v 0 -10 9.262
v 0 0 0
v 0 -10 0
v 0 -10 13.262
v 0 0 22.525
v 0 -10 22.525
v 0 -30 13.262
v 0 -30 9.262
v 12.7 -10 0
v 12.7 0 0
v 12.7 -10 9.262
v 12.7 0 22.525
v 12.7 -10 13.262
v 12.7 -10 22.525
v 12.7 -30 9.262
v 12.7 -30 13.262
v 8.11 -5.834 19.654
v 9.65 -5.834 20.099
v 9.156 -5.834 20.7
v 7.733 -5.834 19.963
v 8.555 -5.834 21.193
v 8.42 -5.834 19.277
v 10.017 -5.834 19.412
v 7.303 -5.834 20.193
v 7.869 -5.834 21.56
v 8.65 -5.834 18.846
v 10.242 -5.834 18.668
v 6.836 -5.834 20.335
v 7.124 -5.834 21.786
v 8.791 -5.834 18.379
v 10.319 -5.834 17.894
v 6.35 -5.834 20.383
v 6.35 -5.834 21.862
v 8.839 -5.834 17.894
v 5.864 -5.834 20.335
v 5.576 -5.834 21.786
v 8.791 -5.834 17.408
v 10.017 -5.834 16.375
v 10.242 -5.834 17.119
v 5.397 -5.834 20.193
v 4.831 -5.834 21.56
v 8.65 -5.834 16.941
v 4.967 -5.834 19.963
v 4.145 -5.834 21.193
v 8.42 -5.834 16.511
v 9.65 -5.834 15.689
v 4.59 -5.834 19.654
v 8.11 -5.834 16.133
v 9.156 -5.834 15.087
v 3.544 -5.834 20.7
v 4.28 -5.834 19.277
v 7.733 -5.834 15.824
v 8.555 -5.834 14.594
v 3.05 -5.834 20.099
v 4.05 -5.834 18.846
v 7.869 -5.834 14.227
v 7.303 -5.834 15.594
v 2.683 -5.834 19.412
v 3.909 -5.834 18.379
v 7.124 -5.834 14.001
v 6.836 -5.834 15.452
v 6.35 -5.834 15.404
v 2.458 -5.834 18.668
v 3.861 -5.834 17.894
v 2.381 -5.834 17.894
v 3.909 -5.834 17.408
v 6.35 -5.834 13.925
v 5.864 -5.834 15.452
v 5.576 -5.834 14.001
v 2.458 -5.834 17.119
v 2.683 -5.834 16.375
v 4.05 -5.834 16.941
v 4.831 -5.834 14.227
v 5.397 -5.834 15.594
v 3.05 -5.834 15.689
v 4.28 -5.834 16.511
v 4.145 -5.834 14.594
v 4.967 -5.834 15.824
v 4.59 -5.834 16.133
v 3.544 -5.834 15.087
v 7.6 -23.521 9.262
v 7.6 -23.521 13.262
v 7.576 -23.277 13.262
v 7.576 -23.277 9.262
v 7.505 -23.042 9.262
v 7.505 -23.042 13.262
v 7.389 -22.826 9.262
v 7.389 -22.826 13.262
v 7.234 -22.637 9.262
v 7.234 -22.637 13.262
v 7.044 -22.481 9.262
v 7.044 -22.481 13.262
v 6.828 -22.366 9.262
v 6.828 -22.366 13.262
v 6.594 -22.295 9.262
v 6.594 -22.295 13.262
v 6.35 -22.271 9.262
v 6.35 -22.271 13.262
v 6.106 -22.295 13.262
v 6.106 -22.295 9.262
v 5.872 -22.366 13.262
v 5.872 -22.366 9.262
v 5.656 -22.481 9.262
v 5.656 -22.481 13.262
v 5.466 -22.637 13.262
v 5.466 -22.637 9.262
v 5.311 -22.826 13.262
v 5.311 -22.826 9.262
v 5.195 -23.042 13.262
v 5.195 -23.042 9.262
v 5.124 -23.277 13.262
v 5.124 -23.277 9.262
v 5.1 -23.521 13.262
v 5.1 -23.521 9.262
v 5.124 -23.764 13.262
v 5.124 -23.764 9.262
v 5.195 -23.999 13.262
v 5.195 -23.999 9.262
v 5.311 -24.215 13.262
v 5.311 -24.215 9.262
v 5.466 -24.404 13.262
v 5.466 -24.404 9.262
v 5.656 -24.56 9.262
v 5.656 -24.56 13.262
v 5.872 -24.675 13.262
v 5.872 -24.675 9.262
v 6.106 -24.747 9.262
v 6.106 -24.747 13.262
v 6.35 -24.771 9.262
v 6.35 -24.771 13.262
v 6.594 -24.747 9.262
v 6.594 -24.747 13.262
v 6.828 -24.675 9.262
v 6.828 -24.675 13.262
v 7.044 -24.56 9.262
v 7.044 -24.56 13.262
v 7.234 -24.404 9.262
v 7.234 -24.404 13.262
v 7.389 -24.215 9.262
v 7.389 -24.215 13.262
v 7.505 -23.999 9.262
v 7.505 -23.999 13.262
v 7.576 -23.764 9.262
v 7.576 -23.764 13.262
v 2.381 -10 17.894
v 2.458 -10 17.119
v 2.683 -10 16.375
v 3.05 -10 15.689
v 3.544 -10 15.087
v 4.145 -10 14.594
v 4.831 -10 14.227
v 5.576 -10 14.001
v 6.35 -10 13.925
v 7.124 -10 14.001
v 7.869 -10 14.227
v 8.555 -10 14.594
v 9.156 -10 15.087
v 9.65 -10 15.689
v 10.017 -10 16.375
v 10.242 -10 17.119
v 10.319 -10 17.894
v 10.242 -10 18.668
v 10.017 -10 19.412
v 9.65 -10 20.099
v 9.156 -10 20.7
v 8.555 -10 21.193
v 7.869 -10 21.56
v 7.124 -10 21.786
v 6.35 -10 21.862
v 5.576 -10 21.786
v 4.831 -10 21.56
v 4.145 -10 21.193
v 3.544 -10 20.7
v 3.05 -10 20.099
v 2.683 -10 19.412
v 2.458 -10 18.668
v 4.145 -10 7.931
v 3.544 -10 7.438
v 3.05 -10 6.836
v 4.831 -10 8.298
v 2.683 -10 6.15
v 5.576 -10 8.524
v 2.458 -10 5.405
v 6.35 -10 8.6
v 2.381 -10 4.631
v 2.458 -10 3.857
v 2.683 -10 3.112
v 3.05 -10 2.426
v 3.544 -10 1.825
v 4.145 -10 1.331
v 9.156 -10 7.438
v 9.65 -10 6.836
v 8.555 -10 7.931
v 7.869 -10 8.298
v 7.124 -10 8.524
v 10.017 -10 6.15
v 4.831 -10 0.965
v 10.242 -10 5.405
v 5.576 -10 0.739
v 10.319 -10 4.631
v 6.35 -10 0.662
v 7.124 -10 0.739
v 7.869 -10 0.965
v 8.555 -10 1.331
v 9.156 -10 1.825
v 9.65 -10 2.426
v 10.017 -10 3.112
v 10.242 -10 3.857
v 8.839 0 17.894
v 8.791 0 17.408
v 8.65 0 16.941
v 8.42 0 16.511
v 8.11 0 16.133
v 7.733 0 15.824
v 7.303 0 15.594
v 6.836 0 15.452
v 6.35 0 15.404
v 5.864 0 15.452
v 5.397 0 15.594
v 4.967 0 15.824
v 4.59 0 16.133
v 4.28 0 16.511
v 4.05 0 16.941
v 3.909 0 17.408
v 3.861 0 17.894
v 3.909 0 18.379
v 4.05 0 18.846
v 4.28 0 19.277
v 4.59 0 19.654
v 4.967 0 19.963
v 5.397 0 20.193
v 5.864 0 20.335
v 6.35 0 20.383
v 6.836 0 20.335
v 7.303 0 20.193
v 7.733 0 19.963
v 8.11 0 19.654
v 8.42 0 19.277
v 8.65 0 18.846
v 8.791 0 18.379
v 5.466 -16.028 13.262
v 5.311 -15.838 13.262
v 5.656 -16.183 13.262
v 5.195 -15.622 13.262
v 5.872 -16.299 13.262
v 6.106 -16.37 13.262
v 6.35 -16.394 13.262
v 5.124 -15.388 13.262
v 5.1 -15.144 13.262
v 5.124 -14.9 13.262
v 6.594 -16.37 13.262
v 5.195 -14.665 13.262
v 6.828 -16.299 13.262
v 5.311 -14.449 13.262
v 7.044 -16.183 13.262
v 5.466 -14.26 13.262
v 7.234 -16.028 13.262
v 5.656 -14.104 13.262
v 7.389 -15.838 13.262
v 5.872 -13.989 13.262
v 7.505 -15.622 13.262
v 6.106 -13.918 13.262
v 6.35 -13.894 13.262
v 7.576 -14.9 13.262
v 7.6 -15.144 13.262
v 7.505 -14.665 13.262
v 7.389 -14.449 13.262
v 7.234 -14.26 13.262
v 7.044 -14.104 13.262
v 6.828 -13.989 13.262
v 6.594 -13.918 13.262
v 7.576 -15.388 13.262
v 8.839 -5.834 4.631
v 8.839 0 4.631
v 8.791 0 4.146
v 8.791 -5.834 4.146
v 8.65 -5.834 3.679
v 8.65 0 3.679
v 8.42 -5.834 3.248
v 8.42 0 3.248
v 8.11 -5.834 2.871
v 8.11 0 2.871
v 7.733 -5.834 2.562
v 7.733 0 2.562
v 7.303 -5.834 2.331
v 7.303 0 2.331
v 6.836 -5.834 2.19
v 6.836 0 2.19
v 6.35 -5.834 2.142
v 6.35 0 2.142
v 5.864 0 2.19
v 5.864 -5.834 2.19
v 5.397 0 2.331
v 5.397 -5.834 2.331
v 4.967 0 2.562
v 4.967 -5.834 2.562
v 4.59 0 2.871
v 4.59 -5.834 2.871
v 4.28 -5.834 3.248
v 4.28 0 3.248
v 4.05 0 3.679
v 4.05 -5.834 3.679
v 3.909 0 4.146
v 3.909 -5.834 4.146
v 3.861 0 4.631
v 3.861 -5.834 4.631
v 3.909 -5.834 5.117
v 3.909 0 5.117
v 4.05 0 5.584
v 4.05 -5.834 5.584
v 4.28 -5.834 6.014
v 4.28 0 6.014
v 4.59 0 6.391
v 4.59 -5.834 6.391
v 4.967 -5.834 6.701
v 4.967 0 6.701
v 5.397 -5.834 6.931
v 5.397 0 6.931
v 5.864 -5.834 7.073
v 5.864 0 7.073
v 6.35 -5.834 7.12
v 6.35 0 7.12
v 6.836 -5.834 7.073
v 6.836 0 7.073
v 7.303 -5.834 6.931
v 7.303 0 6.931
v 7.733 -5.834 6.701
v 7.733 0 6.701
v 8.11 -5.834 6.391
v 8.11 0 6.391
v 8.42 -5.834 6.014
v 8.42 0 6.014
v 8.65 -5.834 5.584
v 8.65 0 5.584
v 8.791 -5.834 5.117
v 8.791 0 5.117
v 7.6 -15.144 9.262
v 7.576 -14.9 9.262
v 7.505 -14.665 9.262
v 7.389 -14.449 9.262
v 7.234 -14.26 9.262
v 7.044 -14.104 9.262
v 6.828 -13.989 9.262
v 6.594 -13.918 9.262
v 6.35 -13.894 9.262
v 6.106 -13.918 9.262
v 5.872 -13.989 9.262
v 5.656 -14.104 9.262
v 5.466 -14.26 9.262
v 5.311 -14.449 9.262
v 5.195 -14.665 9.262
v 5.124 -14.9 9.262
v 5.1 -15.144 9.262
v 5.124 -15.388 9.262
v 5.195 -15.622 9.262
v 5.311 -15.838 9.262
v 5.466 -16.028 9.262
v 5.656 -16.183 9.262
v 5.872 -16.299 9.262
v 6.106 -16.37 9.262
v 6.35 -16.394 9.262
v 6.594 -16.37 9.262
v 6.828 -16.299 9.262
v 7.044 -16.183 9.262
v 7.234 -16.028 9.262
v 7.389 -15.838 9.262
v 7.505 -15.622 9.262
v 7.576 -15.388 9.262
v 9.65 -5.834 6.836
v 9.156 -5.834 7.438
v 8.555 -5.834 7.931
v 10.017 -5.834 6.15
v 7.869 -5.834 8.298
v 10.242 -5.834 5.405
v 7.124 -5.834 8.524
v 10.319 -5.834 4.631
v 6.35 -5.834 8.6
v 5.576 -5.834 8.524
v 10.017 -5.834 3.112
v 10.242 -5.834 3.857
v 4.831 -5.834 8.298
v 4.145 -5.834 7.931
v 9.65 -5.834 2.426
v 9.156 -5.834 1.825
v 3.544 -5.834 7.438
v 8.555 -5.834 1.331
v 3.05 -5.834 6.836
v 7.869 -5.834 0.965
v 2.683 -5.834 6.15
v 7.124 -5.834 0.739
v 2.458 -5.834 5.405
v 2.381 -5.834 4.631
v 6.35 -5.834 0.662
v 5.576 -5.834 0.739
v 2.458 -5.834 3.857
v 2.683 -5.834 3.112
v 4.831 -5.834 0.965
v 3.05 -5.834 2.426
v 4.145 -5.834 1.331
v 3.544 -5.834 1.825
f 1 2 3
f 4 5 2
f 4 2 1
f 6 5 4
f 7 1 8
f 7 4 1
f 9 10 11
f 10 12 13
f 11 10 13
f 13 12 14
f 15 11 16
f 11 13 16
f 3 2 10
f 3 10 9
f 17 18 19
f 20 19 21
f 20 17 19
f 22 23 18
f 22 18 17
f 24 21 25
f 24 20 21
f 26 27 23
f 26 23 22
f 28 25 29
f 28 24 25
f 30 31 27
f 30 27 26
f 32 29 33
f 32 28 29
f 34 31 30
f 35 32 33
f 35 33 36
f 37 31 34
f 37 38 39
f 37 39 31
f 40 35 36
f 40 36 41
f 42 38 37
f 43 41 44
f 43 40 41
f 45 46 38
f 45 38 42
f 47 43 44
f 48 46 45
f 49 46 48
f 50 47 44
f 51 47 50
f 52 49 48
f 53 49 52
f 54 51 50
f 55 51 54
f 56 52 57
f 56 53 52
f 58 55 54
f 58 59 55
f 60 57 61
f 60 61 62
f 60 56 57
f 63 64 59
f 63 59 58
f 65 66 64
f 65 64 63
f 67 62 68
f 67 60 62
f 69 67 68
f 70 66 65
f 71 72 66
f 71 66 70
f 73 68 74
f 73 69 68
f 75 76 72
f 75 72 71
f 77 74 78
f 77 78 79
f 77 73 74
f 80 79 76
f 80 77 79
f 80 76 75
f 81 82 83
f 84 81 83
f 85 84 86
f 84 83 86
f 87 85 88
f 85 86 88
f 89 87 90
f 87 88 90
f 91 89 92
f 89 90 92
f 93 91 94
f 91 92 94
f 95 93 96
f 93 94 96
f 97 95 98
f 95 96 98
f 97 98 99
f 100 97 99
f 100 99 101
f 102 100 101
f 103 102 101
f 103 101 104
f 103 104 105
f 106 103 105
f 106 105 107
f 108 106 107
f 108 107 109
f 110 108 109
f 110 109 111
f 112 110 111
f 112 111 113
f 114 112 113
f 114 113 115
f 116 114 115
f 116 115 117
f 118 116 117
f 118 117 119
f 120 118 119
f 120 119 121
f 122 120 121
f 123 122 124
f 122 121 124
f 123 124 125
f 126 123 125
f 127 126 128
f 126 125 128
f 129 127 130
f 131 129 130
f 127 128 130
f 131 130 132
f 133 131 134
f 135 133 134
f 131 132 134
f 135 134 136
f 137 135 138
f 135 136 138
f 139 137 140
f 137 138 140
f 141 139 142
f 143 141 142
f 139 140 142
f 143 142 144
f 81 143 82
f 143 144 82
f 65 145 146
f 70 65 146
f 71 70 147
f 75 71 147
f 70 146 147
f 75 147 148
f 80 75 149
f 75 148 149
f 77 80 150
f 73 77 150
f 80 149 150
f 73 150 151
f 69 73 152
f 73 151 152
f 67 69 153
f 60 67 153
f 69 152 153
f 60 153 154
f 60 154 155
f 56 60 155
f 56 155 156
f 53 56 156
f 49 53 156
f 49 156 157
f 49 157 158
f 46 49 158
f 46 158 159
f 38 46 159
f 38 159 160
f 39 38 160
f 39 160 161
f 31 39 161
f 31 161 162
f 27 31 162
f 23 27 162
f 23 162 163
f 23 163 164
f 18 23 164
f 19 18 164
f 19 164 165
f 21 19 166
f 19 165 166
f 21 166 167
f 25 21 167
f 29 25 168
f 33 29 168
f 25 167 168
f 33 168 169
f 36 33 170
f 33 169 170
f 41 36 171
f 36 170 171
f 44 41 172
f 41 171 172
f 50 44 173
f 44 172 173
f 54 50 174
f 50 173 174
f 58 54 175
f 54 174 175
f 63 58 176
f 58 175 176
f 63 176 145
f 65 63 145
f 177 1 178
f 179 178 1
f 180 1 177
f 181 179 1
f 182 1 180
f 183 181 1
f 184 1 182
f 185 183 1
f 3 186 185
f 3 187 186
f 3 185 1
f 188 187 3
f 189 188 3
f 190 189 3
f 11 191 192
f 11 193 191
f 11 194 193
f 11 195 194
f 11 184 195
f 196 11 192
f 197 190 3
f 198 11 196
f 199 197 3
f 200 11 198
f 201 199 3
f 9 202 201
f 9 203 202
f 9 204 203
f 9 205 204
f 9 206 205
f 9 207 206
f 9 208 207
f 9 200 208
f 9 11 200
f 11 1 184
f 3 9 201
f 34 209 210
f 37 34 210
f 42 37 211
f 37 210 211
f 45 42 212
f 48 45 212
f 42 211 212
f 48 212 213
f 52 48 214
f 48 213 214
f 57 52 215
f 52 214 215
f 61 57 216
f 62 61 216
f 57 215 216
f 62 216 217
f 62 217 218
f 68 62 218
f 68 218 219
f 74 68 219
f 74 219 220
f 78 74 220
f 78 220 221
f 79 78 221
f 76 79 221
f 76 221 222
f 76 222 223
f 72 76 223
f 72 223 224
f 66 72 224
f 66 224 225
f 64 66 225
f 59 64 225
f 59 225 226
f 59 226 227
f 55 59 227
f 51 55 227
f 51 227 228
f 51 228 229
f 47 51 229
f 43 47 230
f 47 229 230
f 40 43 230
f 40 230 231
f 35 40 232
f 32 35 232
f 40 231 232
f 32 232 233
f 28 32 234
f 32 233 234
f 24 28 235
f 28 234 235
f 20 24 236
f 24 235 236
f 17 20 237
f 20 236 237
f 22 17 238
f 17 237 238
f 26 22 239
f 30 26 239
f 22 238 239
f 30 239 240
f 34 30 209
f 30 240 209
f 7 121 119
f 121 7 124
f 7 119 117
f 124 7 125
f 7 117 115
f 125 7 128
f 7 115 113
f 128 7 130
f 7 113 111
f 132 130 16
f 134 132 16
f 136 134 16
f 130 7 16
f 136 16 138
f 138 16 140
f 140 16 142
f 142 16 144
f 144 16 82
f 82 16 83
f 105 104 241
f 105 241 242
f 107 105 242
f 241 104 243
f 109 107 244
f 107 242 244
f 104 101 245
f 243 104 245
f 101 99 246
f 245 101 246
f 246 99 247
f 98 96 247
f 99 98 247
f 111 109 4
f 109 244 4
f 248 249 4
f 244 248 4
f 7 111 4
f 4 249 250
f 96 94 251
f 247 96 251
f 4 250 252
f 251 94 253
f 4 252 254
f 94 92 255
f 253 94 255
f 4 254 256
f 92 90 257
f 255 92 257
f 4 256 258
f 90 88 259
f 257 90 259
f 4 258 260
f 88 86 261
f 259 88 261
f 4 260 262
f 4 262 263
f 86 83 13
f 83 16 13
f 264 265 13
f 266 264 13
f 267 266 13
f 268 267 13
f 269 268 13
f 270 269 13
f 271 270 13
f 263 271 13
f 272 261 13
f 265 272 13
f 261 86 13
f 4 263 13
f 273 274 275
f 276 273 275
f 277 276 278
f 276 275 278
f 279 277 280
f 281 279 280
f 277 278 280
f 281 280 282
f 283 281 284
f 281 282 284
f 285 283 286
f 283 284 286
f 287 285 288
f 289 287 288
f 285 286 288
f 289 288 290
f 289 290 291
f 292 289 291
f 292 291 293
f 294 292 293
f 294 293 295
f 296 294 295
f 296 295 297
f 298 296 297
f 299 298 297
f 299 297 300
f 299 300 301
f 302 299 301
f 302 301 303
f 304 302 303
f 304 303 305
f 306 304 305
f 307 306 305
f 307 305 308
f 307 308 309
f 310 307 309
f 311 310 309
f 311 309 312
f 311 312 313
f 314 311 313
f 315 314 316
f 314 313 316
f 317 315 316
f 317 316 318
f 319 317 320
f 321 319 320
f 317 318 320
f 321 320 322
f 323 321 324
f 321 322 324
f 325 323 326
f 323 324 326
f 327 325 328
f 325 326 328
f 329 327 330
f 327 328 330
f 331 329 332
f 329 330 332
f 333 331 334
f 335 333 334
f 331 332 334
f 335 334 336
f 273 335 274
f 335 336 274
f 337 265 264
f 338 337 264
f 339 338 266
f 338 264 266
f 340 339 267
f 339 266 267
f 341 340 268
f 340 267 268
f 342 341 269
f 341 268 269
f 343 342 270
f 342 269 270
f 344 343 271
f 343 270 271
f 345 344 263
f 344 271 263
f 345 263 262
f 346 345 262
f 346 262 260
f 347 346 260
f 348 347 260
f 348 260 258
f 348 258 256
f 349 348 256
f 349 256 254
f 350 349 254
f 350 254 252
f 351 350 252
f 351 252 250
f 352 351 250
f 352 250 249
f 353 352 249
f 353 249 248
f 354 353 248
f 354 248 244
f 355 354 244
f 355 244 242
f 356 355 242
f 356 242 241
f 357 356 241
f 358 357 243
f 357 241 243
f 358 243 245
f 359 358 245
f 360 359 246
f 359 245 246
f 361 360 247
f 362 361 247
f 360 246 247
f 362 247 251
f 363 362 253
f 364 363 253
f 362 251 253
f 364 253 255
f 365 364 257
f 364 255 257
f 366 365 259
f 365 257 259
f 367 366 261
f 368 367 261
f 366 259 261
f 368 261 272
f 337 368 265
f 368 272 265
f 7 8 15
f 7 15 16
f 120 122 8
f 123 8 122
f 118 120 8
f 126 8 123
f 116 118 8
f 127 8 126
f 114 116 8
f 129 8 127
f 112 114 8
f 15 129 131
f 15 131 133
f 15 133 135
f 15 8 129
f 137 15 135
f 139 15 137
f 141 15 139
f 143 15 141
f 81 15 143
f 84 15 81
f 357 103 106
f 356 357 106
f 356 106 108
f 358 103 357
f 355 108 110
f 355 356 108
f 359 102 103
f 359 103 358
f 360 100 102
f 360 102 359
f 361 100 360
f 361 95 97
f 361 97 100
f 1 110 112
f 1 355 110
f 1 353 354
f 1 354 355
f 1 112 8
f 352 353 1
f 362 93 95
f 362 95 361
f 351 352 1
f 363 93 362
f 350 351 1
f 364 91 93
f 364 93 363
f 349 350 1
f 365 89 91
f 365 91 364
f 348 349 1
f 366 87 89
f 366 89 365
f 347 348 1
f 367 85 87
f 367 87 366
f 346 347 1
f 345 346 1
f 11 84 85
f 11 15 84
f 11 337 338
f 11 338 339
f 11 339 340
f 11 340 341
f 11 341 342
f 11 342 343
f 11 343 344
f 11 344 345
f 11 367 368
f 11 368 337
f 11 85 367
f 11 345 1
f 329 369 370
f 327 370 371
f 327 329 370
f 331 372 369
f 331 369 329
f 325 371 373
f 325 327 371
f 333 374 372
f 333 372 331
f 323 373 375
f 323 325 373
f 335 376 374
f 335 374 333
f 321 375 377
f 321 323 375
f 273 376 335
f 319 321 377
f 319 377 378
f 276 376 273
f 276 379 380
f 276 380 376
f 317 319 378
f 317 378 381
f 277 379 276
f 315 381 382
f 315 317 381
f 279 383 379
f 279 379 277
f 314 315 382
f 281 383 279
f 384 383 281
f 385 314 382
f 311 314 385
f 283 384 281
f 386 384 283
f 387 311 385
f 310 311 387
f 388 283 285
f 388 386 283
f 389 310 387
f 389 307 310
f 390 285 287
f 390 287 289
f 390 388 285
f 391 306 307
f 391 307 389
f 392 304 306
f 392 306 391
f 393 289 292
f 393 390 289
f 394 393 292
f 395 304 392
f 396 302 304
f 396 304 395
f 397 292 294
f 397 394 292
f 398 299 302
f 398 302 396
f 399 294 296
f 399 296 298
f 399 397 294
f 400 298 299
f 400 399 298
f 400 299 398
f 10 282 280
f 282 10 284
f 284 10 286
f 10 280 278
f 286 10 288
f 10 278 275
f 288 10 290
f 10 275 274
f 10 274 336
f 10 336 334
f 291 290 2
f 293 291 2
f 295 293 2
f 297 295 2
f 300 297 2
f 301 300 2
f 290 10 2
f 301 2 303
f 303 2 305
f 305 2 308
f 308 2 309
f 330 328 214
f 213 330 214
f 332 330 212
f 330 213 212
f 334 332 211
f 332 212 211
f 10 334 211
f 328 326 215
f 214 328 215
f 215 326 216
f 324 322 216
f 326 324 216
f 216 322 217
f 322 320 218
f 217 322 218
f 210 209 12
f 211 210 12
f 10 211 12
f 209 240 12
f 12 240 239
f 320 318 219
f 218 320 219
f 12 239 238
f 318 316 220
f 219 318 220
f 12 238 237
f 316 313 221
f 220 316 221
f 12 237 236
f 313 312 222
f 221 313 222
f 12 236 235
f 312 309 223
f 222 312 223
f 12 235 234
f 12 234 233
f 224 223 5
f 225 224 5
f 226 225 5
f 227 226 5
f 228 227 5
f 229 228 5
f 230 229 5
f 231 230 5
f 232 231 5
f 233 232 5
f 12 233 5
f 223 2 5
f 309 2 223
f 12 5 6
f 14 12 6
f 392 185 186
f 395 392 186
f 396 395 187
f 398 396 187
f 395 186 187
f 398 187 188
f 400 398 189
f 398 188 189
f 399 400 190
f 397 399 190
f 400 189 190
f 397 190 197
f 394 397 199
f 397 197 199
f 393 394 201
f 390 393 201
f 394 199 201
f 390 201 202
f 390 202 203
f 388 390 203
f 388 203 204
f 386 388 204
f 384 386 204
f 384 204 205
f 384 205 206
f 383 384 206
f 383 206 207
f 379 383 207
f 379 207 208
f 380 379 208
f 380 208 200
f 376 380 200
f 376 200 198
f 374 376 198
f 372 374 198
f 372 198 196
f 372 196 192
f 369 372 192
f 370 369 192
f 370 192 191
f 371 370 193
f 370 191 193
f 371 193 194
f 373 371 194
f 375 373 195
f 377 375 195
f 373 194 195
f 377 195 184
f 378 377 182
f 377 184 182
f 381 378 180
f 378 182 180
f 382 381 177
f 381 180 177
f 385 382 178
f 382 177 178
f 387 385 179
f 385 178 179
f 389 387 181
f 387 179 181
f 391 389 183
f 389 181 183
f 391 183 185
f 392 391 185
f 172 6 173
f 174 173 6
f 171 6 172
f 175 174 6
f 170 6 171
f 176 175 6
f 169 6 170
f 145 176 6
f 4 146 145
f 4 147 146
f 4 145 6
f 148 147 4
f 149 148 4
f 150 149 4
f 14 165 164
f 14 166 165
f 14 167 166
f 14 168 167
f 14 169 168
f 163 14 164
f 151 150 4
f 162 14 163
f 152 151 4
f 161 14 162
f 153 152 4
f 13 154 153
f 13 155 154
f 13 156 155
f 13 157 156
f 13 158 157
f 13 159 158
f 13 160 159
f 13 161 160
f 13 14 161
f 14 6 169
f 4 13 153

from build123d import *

# Parameters (mm, degrees)
ESBO_O1_W                = 30
ESBO_O1_H                = 22.5248
RESSALTO_EXTRUS_O1_DEPTH = 12.7
ESBO_O2_W                = 9.2624
ESBO_O2_H                = 20
CORTE_EXTRUS_O1_DEPTH    = 13.7
ESBO_O3_W                = 9.2624
ESBO_O3_H                = 20
CORTE_EXTRUS_O2_DEPTH    = 13.7
FURO1_D                  = 4.9784
FURO1_DEPTH              = 10
FURO1_CBORE_D            = 7.9375
FURO1_CBORE_DEPTH        = 4.1656
ESBO_O8_R                = 1.25
CORTE_EXTRUS_O3_DEPTH    = 10


with BuildPart() as part:
    # Esboço1 → Ressalto-extrusão1 (new body)
    with BuildSketch(Plane(origin=(0, 0, 0), x_dir=(0, -1, 0), z_dir=(-1, 0, 0))):
        with Locations((15, 11.2624)):
            Rectangle(ESBO_O1_W, ESBO_O1_H)
    extrude(amount=-RESSALTO_EXTRUS_O1_DEPTH)

    # Esboço2 → Corte-extrusão1 (cut, through all)
    with BuildSketch(Plane(origin=(12.7, 0, 0), x_dir=(0, 0, -1), z_dir=(1, 0, 0))):
        with Locations((-4.6312, -20)):
            Rectangle(ESBO_O2_W, ESBO_O2_H)
    extrude(amount=-CORTE_EXTRUS_O1_DEPTH, mode=Mode.SUBTRACT)

    # Esboço3 → Corte-extrusão2 (cut, through all)
    with BuildSketch(Plane(origin=(12.7, 0, 0), x_dir=(0, 0, -1), z_dir=(1, 0, 0))):
        with Locations((-17.8936, -20)):
            Rectangle(ESBO_O3_W, ESBO_O3_H)
    extrude(amount=-CORTE_EXTRUS_O2_DEPTH, mode=Mode.SUBTRACT)

    # Furo1
    with Locations(Plane(origin=(0, -10, 0), x_dir=(-1, 0, 0), z_dir=(0, -1, 0))):
        with Locations((-6.35, -4.6312), (-6.35, -17.8936)):
            CounterBoreHole(FURO1_D / 2, FURO1_CBORE_D / 2, FURO1_CBORE_DEPTH, depth=FURO1_DEPTH)

    # Esboço8 → Corte-extrusão3 (cut)
    with BuildSketch(Plane.XY.offset(13.2624)):
        with Locations((6.35, -15.143672471)):
            Circle(ESBO_O8_R)
        with Locations((6.35, -23.520600125)):
            Circle(ESBO_O8_R)
    extrude(amount=-CORTE_EXTRUS_O3_DEPTH, mode=Mode.SUBTRACT)


solid = part.part
